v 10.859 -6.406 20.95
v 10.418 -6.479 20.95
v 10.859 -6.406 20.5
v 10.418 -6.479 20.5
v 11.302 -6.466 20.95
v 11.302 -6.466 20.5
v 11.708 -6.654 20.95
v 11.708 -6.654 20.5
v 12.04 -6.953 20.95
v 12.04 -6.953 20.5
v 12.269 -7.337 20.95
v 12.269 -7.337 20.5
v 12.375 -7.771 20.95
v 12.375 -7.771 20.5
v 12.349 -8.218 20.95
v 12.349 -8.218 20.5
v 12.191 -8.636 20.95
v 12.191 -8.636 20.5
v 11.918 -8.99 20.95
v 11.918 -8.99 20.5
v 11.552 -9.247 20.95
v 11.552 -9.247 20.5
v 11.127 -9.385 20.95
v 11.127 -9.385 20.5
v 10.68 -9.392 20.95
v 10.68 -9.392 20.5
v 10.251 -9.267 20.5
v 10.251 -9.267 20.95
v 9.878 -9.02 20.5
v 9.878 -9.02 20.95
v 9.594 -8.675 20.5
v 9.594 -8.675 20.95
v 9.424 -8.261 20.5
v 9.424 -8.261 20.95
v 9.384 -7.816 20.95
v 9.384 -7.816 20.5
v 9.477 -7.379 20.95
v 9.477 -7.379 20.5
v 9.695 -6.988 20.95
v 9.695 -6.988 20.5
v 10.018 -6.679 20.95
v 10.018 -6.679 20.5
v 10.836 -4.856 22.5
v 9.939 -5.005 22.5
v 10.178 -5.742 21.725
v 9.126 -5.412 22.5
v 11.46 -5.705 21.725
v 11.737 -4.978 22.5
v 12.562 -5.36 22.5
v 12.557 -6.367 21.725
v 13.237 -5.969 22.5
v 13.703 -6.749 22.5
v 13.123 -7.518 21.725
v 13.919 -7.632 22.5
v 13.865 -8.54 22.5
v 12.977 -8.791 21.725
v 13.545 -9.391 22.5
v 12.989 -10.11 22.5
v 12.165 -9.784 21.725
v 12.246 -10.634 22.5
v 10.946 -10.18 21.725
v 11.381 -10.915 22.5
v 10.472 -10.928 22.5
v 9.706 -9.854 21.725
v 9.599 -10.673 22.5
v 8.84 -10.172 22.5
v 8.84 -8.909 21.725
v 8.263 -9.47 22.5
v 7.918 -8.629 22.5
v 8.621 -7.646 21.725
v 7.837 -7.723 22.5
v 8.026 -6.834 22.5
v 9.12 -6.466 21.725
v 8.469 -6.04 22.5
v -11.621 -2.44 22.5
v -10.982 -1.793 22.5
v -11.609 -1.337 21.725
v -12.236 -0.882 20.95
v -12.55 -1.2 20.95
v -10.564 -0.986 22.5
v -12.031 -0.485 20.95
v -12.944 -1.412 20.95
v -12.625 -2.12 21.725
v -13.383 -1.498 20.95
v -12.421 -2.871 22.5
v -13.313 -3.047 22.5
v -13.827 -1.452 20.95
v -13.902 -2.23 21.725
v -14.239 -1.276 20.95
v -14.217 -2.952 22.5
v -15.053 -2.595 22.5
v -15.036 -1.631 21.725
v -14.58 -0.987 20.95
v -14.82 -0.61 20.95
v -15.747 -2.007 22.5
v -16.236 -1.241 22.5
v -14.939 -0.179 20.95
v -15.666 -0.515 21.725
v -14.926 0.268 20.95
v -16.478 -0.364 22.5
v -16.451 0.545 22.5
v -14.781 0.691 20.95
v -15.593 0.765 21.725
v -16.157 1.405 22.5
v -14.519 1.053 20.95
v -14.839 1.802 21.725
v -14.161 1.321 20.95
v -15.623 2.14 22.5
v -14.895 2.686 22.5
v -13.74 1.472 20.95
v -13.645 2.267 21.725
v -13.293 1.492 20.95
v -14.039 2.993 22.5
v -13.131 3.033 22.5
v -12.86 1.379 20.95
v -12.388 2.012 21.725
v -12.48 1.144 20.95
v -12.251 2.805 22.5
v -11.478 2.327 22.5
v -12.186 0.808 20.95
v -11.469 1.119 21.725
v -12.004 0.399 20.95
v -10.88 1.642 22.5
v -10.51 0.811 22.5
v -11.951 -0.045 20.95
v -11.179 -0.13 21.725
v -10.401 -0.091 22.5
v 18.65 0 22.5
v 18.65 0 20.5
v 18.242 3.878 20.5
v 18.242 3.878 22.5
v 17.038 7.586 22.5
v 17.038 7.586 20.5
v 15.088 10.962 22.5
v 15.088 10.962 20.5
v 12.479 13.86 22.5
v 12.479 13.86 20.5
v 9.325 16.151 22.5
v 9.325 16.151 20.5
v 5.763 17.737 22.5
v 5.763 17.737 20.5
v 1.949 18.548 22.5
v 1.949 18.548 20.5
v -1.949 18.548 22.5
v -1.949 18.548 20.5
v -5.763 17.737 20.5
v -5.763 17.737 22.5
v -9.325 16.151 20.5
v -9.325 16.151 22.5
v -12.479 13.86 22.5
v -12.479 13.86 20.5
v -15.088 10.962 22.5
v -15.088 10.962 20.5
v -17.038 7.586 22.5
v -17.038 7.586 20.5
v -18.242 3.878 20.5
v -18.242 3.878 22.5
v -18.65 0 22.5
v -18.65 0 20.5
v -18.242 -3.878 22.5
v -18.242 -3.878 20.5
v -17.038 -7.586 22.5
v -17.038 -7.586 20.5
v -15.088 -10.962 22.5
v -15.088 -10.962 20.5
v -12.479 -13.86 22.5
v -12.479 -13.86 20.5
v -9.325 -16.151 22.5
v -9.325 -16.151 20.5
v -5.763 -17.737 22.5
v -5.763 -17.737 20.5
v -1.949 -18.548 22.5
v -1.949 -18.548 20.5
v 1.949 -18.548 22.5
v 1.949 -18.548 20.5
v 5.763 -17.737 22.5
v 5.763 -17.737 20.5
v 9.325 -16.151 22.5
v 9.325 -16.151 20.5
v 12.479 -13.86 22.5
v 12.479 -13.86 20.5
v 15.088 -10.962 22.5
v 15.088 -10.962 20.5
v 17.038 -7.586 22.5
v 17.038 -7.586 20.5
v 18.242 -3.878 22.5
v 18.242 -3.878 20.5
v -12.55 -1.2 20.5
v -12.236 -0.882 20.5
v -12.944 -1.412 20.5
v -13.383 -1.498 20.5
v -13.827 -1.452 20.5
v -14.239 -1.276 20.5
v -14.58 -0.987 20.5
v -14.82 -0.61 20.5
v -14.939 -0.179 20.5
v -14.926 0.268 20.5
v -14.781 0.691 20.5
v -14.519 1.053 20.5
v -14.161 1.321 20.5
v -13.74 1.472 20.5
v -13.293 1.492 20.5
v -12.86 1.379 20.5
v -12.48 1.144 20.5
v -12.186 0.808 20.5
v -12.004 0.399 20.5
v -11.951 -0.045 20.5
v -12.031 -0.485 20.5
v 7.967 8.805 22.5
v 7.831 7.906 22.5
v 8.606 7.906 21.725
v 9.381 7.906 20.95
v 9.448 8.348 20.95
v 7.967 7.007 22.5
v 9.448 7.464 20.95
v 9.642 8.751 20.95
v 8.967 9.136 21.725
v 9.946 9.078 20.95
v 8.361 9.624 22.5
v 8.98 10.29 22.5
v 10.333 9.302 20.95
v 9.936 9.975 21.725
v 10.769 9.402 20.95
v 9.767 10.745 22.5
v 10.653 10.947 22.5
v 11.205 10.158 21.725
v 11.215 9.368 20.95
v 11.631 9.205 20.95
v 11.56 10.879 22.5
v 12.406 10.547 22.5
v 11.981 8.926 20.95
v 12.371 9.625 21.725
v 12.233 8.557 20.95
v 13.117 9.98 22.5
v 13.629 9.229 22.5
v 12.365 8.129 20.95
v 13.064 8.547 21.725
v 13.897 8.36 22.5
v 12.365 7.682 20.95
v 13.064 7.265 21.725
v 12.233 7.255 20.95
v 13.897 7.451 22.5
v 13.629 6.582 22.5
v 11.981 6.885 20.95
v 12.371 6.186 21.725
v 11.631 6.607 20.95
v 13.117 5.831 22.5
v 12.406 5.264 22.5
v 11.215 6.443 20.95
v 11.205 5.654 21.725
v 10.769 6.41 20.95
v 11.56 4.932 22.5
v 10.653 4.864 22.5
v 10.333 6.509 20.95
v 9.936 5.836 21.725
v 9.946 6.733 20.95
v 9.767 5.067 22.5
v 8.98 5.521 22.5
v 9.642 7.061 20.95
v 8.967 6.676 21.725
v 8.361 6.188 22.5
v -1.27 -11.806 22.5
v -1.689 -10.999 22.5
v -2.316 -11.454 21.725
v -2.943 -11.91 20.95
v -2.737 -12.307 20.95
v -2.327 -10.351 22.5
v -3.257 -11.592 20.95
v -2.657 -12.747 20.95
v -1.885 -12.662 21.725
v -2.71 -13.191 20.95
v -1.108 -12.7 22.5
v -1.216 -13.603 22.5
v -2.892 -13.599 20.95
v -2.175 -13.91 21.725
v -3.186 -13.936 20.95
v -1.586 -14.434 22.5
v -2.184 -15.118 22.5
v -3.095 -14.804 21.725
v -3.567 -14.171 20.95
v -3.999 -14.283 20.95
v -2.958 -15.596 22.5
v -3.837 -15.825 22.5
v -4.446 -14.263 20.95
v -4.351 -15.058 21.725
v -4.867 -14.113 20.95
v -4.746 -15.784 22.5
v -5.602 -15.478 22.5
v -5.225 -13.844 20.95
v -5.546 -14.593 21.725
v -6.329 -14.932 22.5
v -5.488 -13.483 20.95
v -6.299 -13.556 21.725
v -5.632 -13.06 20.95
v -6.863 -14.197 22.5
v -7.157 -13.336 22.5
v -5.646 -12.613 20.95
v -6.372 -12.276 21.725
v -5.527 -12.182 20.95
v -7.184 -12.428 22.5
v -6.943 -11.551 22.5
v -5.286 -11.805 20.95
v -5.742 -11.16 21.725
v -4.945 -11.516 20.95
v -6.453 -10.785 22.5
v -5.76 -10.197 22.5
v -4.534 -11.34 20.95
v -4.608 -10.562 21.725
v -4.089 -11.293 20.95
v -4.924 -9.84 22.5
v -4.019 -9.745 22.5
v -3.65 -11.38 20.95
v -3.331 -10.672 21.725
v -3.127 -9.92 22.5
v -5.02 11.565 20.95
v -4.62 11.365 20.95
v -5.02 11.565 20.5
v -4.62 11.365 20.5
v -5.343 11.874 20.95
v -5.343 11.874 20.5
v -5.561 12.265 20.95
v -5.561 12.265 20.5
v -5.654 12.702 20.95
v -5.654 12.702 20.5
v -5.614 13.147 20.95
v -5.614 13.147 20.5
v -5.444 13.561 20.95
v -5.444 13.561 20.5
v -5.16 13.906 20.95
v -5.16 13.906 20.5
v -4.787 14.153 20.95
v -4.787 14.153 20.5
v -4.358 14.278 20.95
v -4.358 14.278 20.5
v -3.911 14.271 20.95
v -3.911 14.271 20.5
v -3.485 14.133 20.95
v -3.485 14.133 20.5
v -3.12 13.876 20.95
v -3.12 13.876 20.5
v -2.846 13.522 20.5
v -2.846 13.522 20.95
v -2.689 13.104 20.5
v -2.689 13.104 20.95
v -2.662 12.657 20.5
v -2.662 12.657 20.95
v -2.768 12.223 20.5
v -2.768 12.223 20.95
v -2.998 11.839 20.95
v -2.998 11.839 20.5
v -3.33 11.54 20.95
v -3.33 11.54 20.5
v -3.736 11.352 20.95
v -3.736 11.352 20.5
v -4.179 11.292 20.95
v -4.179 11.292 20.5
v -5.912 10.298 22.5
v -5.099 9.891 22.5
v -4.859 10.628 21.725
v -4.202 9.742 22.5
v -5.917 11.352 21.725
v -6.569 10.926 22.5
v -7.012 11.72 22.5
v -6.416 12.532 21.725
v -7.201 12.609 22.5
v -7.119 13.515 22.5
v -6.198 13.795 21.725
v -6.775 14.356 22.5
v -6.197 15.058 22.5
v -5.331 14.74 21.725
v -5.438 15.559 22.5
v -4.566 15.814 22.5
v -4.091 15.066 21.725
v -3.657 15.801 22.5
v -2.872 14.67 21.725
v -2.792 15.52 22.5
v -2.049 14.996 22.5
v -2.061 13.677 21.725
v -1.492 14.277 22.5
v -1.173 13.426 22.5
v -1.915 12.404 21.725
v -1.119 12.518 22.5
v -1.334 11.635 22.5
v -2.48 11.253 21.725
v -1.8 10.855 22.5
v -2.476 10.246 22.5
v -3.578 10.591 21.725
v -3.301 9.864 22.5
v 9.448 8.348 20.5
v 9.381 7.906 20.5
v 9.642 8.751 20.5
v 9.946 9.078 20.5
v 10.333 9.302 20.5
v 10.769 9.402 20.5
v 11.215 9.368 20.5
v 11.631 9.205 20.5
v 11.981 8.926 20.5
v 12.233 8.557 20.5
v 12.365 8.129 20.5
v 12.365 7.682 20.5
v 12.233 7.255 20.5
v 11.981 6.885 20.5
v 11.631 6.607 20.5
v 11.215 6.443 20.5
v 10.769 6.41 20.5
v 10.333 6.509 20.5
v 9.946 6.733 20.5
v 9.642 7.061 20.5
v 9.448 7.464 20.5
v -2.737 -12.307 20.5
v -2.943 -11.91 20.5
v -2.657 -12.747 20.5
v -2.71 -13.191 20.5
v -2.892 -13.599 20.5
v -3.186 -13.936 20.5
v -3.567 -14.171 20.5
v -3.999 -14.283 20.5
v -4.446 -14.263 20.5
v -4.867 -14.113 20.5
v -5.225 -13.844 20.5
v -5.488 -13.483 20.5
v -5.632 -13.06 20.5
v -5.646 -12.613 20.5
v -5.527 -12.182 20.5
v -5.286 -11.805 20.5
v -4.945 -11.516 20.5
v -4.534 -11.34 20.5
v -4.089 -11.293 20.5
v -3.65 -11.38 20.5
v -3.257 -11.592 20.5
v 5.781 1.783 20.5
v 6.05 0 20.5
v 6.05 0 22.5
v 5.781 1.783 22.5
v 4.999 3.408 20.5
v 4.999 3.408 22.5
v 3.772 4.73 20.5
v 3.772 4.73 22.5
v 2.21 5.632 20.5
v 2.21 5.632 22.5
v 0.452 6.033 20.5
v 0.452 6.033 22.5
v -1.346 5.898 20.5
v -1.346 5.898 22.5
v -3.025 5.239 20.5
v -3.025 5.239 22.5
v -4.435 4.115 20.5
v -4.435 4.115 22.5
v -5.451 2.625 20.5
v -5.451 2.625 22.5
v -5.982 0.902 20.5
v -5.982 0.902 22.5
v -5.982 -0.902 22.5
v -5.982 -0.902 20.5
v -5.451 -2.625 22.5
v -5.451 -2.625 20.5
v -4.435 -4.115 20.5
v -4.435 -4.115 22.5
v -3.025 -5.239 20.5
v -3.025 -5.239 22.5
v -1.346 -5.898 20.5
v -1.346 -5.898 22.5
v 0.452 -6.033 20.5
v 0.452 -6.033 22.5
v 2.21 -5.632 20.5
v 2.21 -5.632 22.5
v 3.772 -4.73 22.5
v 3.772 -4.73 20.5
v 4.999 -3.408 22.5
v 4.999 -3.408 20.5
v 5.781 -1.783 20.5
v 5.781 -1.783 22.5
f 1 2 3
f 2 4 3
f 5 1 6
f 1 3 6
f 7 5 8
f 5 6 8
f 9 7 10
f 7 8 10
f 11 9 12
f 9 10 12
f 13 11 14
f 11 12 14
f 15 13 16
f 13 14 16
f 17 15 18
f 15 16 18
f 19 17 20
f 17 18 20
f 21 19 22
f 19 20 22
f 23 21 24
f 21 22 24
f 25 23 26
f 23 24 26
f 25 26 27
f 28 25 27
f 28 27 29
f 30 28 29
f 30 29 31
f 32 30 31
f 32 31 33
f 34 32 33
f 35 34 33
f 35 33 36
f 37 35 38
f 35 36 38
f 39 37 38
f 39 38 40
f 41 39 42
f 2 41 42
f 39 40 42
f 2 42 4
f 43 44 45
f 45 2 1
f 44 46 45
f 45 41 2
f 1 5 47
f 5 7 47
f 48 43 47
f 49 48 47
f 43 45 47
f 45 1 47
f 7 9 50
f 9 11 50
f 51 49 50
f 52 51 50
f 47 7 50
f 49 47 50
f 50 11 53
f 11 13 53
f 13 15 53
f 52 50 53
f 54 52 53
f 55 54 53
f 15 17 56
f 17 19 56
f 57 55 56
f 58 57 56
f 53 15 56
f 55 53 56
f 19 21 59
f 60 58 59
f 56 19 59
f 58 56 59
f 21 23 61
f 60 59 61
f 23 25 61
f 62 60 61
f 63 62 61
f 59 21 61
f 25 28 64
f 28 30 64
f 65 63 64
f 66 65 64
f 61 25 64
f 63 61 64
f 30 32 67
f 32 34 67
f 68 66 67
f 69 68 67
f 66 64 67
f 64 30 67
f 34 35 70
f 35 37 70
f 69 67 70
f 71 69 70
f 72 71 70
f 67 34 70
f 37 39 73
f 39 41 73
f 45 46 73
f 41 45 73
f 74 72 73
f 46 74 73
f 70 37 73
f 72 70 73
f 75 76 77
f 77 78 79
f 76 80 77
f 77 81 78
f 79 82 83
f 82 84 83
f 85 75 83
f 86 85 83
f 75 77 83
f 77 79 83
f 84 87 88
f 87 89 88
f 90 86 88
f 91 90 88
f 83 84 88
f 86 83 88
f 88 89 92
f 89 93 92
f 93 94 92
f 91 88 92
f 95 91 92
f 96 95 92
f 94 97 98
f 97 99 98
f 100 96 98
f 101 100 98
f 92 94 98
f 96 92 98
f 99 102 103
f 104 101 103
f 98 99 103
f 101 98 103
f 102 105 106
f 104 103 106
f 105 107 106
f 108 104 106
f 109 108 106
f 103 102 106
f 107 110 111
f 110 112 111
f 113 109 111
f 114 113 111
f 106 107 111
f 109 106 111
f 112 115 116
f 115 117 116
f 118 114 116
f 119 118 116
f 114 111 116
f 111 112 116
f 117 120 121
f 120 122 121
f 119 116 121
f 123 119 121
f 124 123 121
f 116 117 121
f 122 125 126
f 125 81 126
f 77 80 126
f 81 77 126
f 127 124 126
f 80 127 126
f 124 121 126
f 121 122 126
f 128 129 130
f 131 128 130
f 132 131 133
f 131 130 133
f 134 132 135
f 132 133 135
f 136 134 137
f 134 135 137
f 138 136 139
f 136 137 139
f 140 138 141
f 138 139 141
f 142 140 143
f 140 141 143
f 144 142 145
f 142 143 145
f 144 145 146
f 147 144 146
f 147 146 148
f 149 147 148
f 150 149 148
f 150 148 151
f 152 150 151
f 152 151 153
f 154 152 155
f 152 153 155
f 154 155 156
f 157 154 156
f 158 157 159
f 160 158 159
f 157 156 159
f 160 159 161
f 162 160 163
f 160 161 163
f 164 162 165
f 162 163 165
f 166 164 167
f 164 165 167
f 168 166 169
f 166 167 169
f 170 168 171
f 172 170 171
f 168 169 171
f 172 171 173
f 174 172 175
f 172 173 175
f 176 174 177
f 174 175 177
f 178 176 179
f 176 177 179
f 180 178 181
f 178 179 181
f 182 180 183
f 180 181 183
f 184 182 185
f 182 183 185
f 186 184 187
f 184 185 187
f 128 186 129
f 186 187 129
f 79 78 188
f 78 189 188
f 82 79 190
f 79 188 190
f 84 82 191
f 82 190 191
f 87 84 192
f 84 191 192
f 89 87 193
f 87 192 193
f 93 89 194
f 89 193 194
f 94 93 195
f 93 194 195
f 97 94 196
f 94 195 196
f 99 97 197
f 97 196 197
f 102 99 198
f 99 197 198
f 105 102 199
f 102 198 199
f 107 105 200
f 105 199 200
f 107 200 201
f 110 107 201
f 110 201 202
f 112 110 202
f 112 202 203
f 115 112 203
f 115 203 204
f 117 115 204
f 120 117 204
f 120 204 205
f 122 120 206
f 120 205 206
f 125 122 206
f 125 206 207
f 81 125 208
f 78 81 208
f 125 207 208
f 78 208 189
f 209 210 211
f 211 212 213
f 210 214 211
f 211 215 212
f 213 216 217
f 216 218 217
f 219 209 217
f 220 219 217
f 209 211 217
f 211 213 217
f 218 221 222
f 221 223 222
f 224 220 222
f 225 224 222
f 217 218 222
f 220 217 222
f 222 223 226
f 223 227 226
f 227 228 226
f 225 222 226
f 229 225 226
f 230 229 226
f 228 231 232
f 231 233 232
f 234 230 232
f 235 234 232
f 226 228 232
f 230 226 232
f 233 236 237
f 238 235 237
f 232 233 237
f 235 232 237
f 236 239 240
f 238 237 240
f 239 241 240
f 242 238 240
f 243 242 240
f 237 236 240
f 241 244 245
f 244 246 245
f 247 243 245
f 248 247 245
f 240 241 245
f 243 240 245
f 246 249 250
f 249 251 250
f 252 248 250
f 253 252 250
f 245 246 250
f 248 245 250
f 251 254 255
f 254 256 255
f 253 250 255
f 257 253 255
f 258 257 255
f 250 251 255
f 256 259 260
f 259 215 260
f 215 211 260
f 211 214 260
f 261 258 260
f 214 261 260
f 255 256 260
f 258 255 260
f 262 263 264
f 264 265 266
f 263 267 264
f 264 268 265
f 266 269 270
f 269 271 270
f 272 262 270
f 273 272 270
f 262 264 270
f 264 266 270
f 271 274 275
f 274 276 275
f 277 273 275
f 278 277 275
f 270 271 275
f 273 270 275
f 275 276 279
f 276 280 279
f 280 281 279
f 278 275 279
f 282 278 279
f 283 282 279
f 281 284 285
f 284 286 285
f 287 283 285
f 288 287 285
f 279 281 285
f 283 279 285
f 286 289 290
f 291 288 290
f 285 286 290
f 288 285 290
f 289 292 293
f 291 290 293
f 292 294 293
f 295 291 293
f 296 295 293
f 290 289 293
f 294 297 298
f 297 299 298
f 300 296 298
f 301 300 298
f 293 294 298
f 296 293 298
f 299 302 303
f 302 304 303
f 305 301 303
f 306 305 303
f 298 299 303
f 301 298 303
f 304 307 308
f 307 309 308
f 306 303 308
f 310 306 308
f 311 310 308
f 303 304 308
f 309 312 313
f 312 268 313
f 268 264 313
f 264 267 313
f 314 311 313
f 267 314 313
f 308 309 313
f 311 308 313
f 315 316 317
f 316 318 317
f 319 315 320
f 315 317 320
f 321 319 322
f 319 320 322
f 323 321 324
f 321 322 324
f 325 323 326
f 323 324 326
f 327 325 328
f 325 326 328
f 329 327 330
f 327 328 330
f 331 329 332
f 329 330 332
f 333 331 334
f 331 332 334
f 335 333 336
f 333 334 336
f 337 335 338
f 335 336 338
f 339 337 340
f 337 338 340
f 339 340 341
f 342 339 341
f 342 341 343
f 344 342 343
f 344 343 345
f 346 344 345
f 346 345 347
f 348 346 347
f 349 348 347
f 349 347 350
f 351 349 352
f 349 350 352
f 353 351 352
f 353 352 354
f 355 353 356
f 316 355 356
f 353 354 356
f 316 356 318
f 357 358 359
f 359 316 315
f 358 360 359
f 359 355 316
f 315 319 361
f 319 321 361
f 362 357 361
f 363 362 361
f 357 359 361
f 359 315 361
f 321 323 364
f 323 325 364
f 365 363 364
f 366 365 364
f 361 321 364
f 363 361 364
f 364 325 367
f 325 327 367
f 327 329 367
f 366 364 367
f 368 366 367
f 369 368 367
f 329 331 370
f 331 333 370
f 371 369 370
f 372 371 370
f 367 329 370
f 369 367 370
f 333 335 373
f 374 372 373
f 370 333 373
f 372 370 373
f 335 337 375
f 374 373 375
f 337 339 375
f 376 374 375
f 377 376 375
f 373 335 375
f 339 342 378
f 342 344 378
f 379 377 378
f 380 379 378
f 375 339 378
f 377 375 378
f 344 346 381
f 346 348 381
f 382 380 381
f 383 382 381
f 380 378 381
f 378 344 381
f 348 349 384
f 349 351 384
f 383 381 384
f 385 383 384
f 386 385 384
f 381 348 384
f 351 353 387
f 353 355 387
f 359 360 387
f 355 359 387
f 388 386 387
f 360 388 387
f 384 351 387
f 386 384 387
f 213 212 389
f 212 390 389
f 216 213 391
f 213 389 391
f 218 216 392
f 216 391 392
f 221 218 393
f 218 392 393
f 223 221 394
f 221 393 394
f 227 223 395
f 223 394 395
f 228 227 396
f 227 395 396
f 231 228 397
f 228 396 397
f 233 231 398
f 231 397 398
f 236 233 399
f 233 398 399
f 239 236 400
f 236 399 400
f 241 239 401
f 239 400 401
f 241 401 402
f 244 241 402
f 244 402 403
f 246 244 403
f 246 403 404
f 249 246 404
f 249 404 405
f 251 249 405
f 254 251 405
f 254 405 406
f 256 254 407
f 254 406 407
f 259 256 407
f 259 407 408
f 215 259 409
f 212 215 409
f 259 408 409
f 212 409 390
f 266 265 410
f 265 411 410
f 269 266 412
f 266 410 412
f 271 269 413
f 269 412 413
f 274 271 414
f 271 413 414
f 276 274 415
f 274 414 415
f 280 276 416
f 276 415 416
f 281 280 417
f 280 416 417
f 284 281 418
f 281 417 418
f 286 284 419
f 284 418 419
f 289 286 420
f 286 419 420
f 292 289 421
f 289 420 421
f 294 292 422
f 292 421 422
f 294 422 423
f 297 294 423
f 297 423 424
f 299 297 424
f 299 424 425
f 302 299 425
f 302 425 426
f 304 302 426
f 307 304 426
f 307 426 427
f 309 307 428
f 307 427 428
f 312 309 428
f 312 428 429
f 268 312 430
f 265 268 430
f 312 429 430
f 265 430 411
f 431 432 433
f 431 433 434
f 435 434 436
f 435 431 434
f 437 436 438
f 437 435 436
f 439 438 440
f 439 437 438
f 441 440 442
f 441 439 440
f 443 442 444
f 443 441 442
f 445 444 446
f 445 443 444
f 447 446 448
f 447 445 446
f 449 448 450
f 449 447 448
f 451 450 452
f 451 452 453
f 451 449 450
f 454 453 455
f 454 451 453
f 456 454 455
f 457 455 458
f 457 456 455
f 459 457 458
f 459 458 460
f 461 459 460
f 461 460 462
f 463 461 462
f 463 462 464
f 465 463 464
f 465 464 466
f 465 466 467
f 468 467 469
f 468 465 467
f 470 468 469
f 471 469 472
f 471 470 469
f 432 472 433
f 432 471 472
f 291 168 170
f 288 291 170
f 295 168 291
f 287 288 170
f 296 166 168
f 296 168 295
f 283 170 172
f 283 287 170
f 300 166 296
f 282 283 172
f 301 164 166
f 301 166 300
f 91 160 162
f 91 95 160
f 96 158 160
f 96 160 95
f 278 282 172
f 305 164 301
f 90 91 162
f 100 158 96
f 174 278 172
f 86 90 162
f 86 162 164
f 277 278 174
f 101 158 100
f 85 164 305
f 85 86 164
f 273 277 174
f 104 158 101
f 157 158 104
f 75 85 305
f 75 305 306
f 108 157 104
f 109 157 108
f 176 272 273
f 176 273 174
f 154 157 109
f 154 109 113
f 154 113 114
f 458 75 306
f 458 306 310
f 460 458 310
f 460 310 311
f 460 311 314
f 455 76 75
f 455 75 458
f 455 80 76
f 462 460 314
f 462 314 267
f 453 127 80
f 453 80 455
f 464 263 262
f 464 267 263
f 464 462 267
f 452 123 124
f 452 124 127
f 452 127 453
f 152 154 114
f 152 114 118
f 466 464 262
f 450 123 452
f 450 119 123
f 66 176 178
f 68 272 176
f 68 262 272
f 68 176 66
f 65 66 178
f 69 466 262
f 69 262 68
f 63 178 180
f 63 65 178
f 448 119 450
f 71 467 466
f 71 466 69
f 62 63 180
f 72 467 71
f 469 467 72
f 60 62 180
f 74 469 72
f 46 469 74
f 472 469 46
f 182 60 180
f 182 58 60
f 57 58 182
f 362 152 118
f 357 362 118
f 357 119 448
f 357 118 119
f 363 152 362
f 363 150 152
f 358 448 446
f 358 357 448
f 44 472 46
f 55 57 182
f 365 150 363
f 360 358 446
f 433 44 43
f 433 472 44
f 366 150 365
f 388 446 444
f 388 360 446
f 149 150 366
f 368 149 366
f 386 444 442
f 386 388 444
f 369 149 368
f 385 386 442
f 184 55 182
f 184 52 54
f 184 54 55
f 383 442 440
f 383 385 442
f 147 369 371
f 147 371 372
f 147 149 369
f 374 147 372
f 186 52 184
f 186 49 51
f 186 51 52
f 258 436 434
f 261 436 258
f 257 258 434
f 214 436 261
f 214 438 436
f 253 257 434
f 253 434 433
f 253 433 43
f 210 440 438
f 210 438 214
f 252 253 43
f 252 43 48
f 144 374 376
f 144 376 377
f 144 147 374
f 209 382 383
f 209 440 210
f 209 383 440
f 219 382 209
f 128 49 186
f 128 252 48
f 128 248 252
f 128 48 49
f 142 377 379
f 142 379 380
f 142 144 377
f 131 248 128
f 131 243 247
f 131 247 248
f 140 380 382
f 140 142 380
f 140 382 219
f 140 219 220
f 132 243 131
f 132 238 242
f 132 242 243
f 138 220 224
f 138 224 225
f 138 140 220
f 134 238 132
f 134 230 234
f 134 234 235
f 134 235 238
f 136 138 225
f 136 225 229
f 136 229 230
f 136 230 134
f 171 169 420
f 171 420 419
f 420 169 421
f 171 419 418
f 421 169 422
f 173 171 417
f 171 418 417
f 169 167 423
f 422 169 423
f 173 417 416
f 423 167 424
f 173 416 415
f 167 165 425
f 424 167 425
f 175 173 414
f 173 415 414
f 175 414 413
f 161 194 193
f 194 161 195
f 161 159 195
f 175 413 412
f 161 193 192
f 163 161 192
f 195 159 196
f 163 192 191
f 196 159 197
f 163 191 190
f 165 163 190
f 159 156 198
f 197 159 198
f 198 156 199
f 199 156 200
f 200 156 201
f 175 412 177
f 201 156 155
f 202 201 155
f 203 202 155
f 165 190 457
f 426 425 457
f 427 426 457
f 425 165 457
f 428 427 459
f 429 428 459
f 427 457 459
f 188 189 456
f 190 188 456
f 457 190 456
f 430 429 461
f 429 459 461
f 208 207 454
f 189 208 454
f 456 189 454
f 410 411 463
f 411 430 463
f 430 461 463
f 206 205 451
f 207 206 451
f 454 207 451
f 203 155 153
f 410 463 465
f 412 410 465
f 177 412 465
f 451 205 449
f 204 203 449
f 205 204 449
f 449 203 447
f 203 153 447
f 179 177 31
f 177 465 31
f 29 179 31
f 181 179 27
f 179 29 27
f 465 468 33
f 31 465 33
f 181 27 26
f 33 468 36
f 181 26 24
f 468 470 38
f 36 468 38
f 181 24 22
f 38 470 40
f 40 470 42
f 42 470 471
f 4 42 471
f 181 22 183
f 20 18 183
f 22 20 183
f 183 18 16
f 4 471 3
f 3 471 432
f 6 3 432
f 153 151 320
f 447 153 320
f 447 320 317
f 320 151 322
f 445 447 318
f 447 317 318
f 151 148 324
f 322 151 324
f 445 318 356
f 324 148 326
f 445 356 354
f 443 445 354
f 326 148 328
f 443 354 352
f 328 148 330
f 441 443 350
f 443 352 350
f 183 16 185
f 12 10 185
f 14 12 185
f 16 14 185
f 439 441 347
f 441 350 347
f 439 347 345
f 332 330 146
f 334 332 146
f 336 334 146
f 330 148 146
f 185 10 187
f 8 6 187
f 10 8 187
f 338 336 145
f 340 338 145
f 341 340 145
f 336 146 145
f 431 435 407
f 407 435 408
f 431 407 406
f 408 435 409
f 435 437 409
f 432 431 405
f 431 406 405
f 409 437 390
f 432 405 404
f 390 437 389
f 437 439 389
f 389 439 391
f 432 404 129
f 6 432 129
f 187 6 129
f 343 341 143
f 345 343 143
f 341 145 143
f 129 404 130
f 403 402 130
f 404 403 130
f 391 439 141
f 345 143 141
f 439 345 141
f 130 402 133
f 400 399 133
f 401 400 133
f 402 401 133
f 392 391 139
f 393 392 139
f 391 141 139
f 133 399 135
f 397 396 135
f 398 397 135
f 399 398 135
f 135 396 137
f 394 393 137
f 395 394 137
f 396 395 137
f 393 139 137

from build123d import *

# Parameters (mm, degrees)
SKETCH046_R           = 18.65
SKETCH046_R_2         = 6.05
PAD013_DEPTH          = 2
HOLE001_D             = 3
HOLE001_CSINK_D       = 6.1
HOLE001_CSINK_ANGLE   = 90
POLARPATTERN002_COUNT = 5


with BuildPart() as part:
    # Sketch046 → Pad013 (new body)
    with BuildSketch(Plane.XY.offset(20.5)):
        Circle(SKETCH046_R)
        Circle(SKETCH046_R_2, mode=Mode.SUBTRACT)
    extrude(amount=PAD013_DEPTH)

    # Hole001 (through all)
    with Locations(Plane.XY.offset(22.5)):
        with Locations((10.881279, 7.905712)):
            hole001 = CounterSinkHole(HOLE001_D / 2, HOLE001_CSINK_D / 2, counter_sink_angle=HOLE001_CSINK_ANGLE)

    # PolarPattern002: Hole001 ×5 about axis
    polarpattern002_axis = Axis((0, 0, 22.5), (0, 0, 1))
    for i in range(1, POLARPATTERN002_COUNT):
        add(hole001.rotate(polarpattern002_axis, i * 360 / POLARPATTERN002_COUNT), mode=Mode.SUBTRACT)


solid = part.part
